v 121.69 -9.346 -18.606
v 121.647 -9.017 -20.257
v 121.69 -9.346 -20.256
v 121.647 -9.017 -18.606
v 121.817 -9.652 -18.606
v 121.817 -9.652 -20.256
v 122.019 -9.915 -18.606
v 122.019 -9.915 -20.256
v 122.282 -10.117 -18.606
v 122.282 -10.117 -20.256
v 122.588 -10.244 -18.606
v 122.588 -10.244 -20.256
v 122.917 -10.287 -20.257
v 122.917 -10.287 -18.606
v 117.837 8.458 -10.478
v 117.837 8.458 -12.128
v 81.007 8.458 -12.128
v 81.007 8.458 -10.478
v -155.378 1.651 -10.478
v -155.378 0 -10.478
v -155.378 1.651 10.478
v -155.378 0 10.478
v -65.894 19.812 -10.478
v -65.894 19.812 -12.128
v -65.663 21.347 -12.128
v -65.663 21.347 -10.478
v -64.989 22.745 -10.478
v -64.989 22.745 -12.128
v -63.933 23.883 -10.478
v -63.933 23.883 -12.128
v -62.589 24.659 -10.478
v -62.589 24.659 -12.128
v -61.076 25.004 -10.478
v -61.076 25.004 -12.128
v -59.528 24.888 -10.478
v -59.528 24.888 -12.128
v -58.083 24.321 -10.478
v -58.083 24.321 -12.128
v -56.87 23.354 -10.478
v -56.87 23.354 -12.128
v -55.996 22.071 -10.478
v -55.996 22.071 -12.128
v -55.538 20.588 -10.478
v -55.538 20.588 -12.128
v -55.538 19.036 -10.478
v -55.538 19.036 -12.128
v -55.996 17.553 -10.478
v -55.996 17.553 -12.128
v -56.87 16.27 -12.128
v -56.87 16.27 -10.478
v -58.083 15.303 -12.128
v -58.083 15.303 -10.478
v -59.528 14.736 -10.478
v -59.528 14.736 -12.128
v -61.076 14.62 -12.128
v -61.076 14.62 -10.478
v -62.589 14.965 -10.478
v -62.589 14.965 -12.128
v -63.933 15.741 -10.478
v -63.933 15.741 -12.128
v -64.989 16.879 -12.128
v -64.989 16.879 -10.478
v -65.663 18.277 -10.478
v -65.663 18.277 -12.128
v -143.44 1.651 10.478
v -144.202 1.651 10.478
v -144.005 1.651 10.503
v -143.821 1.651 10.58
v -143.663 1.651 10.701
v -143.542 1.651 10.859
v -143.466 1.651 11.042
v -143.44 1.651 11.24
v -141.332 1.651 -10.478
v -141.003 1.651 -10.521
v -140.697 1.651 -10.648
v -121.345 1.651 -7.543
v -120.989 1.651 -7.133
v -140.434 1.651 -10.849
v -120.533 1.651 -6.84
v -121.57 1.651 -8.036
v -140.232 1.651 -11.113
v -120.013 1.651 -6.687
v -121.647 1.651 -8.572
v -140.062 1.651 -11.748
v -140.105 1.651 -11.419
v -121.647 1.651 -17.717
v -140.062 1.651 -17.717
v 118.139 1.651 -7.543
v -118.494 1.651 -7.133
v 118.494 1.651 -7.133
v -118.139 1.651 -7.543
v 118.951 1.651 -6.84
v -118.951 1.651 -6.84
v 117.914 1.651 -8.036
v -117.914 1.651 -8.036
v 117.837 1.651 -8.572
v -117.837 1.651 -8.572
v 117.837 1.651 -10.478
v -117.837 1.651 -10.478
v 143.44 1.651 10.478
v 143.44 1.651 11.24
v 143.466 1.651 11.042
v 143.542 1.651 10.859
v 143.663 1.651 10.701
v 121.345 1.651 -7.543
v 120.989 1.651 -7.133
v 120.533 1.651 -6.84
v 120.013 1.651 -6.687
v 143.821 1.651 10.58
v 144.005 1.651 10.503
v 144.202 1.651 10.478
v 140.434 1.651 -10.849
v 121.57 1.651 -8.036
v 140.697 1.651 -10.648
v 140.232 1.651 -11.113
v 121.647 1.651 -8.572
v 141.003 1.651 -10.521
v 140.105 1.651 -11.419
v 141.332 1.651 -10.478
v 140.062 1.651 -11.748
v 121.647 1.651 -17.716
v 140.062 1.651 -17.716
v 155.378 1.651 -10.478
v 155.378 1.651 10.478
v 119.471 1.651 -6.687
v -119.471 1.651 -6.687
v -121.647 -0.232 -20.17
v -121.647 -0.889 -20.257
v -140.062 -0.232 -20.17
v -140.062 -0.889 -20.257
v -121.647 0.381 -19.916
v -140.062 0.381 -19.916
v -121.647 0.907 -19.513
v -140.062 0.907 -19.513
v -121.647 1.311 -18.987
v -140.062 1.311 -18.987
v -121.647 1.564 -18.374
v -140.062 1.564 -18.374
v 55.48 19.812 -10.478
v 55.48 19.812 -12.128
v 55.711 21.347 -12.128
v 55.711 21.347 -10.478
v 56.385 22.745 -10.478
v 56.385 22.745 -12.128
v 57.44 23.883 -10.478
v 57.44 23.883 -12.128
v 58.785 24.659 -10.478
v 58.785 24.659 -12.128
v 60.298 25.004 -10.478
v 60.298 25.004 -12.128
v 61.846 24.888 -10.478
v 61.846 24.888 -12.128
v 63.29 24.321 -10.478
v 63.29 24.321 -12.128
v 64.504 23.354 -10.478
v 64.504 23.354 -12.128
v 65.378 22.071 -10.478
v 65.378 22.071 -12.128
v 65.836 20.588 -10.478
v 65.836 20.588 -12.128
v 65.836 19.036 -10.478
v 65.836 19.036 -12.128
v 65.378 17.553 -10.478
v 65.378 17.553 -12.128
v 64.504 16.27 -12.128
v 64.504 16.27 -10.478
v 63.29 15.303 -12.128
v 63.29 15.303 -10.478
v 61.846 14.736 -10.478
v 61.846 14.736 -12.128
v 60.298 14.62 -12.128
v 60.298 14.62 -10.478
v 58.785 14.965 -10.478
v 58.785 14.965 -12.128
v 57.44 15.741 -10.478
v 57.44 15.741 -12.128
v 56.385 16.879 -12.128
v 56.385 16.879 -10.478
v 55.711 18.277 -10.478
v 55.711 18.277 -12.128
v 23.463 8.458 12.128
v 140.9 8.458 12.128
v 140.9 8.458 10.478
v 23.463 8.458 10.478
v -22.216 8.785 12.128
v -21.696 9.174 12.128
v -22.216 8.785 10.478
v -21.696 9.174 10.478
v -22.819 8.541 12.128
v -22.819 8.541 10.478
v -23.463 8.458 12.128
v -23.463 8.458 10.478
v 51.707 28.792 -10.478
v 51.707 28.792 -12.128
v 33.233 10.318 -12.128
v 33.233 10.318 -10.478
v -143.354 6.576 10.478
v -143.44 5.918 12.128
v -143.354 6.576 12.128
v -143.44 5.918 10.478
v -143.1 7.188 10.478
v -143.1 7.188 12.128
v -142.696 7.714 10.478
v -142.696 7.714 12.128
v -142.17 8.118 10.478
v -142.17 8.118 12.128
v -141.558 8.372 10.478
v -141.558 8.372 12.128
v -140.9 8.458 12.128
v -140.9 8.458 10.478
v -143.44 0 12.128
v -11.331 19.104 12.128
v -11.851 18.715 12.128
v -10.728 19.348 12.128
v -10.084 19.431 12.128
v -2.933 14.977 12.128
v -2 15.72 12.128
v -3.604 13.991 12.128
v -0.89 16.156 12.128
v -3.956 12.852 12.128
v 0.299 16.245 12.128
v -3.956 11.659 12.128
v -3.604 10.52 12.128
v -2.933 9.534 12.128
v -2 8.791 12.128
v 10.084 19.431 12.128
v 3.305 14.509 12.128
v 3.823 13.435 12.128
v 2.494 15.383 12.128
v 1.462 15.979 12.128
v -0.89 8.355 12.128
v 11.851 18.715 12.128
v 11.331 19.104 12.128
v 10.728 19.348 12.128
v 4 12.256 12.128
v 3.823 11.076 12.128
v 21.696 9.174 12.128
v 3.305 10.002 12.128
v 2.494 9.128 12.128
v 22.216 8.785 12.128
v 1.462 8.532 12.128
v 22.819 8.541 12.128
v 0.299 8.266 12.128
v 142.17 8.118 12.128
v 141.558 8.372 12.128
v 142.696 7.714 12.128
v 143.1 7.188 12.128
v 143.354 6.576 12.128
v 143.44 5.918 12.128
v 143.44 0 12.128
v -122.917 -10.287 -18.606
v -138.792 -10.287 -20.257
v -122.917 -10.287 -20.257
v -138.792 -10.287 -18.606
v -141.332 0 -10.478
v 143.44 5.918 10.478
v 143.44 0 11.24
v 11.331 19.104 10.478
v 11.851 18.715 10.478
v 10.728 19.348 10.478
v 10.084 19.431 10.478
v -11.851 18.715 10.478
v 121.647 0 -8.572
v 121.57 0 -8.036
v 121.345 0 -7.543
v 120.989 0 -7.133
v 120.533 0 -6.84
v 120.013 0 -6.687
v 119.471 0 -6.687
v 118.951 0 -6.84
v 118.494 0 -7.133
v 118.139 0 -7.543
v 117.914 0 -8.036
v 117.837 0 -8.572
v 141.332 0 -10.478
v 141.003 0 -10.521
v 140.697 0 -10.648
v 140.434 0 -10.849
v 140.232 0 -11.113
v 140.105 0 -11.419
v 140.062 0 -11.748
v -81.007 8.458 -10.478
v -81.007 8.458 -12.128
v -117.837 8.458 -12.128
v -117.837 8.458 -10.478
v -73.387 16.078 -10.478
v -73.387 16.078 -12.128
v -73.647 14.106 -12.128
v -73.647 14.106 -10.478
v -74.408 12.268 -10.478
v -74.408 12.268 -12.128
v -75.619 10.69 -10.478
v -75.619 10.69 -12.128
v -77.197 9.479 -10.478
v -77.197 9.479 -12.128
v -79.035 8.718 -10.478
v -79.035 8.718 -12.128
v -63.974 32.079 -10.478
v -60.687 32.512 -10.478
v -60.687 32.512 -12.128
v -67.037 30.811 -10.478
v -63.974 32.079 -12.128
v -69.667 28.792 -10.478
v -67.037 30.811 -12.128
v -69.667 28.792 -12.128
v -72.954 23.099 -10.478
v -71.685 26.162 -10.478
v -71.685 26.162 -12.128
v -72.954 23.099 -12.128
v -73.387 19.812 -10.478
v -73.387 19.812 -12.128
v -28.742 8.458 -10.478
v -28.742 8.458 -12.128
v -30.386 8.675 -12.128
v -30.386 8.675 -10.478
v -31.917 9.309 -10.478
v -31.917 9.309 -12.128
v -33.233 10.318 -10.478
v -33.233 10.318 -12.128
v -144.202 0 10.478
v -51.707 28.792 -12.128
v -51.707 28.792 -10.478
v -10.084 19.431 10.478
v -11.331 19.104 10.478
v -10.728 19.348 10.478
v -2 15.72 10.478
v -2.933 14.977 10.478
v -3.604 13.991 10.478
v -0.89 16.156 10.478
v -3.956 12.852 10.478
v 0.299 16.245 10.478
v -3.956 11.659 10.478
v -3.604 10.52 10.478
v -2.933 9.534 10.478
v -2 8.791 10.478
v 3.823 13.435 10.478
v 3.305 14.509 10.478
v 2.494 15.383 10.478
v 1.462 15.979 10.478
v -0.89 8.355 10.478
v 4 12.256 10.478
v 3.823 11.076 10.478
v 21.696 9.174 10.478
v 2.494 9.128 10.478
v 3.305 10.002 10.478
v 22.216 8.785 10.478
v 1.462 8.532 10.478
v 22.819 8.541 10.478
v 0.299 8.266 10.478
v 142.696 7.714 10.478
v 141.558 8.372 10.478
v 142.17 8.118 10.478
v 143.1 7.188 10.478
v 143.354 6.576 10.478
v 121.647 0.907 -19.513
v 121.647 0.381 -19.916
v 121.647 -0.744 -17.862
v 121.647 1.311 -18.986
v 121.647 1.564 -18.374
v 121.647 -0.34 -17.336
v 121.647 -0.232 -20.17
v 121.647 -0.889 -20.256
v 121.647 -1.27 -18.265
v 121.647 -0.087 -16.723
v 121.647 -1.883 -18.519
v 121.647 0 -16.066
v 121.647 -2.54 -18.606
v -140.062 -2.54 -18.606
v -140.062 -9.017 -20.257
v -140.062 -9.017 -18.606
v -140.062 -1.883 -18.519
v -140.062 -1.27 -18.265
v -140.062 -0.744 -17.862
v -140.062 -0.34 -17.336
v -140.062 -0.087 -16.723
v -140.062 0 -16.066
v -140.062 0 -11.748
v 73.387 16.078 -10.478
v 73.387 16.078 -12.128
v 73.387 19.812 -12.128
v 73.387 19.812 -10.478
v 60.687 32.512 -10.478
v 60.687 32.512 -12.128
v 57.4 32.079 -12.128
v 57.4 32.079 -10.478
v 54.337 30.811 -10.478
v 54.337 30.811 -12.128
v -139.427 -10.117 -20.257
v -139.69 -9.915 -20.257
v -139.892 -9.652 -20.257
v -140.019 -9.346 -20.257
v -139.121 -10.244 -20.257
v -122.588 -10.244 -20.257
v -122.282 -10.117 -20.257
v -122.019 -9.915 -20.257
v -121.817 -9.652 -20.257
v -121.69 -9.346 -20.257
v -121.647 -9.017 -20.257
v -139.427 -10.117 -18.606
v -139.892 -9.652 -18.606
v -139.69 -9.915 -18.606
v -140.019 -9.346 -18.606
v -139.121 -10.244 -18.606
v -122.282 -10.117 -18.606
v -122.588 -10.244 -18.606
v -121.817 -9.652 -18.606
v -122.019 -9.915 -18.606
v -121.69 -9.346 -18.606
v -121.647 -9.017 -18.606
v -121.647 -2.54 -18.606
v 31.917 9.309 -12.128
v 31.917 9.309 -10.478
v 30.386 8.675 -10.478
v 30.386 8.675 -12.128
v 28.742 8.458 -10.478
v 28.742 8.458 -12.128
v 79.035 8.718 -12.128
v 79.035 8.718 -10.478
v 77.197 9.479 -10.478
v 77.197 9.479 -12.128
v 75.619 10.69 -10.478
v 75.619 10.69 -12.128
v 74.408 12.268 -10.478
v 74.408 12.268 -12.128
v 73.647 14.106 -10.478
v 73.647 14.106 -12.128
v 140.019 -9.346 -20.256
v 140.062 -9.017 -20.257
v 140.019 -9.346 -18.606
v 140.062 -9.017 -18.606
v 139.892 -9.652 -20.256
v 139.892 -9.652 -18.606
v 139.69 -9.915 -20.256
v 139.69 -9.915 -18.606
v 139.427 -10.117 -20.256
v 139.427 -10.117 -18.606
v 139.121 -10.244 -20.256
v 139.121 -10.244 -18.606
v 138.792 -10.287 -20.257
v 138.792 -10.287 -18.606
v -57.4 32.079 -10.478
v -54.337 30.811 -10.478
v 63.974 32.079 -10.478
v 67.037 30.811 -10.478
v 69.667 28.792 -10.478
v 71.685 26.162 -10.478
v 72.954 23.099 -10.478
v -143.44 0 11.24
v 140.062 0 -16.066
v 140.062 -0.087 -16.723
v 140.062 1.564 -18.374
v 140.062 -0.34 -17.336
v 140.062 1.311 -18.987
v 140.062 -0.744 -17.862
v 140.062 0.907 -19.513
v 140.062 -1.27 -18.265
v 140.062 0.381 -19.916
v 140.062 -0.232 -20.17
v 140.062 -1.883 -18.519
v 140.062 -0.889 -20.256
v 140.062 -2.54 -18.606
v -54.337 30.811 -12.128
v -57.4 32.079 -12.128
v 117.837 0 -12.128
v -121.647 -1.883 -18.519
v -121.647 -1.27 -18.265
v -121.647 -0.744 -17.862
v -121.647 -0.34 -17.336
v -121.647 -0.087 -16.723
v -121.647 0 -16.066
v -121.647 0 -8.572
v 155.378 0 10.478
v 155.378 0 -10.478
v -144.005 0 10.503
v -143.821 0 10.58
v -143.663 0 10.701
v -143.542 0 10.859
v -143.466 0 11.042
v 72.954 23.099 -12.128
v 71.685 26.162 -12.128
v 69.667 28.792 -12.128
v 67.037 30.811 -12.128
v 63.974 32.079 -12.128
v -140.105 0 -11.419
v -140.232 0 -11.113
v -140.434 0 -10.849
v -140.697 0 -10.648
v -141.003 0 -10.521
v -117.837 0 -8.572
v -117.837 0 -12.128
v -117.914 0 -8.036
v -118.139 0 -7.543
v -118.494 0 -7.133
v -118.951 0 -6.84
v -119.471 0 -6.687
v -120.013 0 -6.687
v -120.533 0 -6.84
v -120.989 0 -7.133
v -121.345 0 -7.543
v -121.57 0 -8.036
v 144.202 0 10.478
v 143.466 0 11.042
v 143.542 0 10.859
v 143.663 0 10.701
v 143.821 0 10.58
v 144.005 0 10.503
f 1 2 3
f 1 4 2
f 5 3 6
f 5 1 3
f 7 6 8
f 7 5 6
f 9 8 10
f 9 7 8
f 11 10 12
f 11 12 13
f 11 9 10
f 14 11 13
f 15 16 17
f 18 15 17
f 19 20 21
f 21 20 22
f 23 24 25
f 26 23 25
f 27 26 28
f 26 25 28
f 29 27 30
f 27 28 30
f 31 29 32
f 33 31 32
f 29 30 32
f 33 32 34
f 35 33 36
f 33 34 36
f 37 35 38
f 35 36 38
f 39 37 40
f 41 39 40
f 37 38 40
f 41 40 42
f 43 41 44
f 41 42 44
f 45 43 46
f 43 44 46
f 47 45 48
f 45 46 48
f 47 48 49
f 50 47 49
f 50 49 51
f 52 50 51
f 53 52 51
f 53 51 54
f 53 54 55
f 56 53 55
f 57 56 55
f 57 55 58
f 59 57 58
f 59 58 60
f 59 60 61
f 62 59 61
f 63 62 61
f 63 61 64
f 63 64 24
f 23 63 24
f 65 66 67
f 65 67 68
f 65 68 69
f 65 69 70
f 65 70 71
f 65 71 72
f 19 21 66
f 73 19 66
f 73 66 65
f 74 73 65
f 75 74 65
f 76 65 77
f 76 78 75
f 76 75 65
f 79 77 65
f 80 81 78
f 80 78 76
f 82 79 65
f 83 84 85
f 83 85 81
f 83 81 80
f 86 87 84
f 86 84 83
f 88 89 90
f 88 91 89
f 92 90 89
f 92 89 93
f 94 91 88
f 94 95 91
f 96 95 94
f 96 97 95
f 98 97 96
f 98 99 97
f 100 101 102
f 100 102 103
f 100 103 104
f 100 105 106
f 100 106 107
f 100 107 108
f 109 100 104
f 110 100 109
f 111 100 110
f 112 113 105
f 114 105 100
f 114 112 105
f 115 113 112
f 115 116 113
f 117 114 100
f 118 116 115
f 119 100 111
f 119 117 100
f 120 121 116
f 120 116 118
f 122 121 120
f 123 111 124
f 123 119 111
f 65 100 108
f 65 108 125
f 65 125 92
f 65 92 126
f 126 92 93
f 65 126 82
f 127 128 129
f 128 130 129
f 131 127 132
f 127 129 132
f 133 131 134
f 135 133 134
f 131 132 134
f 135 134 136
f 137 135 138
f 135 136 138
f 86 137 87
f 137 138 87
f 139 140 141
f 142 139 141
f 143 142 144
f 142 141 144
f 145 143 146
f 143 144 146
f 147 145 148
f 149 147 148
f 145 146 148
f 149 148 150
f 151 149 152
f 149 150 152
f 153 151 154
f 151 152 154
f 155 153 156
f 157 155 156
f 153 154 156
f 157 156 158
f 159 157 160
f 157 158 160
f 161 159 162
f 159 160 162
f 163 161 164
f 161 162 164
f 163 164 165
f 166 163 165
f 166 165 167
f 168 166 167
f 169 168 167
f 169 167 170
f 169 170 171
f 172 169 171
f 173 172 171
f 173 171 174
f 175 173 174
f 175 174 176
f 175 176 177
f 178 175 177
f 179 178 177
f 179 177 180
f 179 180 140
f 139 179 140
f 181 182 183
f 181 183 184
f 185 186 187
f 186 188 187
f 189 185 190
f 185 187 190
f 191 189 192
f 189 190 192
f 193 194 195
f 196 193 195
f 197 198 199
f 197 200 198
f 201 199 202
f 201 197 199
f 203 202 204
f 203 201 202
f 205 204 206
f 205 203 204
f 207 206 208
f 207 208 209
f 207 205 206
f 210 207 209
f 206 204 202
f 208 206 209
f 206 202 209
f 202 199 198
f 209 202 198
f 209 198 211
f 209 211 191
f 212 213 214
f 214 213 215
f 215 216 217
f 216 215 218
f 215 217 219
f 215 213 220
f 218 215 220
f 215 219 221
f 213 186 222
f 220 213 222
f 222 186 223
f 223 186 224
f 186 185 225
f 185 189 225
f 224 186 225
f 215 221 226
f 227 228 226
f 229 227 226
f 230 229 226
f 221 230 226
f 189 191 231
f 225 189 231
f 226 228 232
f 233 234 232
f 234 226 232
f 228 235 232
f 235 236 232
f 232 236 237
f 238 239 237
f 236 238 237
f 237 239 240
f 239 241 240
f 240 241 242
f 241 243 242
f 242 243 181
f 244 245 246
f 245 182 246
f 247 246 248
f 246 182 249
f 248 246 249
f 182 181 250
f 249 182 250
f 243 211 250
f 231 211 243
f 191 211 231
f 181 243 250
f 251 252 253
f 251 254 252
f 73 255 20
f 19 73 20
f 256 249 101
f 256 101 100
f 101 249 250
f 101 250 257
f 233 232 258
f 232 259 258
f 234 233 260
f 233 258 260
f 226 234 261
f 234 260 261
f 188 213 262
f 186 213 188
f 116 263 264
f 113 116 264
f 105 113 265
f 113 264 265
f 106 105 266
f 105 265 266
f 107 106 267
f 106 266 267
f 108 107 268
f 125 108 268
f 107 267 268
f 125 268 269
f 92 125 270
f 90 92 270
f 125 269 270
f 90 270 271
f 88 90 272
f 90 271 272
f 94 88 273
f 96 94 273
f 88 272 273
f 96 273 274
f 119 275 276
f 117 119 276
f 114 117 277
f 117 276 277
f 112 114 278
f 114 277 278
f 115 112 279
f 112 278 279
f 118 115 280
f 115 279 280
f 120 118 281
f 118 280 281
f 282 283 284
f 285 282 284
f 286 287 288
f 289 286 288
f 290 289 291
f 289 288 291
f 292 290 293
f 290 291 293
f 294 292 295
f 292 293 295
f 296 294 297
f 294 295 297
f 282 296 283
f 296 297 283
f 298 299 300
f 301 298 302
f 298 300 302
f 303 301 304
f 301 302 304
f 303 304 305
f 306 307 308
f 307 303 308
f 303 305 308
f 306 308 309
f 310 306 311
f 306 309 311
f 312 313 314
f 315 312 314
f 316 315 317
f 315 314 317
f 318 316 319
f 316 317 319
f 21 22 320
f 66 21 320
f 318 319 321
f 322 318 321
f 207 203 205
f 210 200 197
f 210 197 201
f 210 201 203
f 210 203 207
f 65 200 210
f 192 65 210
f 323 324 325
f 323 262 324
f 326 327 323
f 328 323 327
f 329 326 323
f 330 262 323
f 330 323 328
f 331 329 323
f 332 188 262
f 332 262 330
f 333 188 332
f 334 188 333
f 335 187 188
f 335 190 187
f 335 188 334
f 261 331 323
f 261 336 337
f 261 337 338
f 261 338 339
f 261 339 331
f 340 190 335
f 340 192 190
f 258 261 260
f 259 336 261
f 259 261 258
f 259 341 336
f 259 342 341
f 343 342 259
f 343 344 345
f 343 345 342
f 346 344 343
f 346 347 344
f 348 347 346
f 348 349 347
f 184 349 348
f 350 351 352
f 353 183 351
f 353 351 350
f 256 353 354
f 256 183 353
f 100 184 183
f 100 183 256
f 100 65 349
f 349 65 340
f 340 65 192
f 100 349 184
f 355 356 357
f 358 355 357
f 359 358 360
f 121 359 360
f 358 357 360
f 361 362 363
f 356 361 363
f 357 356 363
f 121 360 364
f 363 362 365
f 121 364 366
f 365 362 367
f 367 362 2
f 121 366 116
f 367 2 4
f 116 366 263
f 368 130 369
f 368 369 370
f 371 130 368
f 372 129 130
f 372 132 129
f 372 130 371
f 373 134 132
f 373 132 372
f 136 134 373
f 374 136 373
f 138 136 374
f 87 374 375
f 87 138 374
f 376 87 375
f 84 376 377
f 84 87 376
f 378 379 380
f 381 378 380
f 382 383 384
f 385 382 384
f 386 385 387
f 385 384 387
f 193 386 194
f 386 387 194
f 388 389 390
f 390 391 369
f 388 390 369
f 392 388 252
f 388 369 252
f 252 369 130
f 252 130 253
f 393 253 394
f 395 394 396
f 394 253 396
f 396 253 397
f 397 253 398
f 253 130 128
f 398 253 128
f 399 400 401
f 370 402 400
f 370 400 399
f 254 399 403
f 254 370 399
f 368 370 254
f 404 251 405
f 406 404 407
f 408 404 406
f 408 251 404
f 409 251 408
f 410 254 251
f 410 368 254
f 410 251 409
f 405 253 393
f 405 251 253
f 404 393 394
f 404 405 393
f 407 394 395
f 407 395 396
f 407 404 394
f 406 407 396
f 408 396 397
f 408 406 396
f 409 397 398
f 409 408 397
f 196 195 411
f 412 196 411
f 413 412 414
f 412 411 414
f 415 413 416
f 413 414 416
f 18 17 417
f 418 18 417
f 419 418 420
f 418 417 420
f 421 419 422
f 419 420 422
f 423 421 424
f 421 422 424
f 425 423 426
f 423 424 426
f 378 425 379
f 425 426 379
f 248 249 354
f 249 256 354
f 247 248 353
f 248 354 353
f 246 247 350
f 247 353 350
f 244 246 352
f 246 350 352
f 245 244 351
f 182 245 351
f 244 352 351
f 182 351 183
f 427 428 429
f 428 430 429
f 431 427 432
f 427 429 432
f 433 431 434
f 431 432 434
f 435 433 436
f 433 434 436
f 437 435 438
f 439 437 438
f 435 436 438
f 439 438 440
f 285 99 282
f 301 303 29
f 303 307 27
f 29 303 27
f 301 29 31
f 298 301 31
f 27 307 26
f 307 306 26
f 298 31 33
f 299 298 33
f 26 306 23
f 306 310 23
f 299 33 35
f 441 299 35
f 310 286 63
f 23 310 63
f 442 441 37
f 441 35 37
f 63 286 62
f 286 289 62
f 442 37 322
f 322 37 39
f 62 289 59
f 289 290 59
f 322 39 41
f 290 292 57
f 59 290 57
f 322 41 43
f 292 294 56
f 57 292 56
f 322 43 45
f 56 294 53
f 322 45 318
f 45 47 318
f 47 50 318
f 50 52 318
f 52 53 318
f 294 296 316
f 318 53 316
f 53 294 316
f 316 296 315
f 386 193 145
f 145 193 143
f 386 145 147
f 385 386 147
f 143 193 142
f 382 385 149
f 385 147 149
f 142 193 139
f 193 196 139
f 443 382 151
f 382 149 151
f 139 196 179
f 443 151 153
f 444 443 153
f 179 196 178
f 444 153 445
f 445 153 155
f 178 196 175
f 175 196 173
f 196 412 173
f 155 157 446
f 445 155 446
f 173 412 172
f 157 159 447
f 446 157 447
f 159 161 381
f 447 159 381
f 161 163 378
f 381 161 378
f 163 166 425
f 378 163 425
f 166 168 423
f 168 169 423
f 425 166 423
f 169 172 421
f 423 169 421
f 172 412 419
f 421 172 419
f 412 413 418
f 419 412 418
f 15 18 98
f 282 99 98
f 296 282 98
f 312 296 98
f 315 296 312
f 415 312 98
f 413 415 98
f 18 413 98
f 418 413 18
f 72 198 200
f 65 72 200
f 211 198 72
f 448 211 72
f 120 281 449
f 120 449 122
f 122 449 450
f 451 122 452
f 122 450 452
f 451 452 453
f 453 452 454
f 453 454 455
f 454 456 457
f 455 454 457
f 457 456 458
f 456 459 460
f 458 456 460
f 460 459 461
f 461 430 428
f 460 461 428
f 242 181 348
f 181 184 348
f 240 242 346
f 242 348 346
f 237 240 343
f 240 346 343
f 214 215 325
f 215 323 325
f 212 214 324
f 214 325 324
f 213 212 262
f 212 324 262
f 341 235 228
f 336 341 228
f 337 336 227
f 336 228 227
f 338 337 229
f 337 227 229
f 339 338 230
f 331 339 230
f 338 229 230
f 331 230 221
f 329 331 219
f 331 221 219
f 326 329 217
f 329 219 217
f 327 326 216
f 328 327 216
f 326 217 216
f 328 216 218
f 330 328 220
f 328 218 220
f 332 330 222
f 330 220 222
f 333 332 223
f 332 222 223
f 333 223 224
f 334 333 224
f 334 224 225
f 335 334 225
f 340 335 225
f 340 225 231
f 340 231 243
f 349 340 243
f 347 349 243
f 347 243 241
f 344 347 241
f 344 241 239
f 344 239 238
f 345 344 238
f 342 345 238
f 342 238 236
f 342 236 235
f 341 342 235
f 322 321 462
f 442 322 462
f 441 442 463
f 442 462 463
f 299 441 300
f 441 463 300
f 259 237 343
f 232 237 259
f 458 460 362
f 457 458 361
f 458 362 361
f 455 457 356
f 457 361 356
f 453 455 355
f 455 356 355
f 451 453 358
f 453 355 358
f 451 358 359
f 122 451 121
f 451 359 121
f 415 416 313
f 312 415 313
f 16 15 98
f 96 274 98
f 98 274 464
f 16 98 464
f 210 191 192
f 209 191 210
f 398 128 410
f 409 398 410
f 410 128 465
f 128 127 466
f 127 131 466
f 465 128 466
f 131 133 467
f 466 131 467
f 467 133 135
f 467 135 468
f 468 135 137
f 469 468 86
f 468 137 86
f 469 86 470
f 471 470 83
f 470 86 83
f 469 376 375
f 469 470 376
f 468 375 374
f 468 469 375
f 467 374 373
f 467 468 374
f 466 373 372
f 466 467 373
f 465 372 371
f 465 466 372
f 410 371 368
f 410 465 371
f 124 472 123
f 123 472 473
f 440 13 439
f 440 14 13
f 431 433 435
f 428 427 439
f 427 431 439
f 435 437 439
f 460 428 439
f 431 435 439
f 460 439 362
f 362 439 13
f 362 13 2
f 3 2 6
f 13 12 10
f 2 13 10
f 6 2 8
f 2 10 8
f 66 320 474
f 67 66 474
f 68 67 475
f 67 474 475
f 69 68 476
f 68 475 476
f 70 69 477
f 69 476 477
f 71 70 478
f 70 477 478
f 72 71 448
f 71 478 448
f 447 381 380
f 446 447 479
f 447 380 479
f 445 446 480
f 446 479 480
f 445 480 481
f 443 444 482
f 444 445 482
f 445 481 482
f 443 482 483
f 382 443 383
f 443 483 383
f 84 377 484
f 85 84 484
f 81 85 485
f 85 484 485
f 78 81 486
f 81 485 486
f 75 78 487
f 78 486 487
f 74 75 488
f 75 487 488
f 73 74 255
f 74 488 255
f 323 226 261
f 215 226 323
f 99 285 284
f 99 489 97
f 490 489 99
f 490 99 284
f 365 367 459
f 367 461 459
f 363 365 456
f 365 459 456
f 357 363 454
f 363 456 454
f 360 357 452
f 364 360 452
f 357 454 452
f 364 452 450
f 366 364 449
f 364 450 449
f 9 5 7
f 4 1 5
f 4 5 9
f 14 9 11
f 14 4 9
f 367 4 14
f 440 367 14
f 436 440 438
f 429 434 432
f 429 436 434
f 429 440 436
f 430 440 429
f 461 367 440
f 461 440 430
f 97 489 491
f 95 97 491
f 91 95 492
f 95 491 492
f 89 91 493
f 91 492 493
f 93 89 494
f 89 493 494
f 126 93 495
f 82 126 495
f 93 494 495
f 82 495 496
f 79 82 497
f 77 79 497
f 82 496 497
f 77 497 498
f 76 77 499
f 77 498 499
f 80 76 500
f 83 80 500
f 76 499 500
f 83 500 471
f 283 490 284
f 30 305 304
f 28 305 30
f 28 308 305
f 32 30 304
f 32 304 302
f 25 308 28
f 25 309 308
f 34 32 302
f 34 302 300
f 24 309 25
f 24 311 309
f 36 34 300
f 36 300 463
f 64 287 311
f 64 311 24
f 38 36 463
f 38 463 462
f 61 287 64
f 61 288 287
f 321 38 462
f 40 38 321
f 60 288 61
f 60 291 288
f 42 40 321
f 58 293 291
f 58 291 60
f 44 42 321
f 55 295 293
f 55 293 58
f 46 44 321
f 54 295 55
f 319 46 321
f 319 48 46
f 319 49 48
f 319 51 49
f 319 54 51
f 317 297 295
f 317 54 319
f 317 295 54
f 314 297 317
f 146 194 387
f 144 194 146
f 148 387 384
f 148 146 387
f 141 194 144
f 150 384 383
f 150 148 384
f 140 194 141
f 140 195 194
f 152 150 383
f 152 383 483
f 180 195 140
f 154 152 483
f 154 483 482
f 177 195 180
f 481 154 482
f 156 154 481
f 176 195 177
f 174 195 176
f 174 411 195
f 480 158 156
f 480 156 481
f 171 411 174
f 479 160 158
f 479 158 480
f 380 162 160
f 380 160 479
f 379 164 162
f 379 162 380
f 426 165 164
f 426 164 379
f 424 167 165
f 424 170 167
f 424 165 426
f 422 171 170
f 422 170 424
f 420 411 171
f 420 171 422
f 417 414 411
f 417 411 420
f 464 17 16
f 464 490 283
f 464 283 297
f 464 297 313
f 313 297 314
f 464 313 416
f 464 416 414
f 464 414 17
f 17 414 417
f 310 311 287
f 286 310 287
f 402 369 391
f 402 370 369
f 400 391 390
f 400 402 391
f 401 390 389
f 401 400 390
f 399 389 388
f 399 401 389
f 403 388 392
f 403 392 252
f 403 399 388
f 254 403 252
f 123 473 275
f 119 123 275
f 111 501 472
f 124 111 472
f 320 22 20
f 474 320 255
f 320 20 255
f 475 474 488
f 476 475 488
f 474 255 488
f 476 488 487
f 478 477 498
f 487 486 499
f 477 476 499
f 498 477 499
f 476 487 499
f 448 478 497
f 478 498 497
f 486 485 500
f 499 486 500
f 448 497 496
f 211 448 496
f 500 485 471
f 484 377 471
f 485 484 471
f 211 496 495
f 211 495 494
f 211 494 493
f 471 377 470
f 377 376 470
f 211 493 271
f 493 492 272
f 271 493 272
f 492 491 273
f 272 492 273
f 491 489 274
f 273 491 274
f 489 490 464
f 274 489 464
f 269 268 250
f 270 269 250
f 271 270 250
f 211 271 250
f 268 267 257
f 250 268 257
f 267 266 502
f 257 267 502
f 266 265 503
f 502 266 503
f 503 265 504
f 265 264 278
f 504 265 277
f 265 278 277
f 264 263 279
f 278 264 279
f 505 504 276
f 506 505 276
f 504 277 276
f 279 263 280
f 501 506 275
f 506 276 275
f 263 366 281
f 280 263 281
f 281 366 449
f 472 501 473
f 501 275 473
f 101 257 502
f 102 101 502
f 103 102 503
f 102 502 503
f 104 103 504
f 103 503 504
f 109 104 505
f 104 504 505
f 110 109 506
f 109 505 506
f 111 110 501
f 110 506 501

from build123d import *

# Parameters (mm, degrees)
BOSS_EXTRUDE1_DEPTH = 1.651
SKETCH2_W           = 18.415
SKETCH2_H           = 1.651
BOSS_EXTRUDE2_DEPTH = 10.287
FILLET1_R           = 2.54
FILLET3_R           = 1.27
SKETCH4_W           = 235.6739
SKETCH4_H           = 1.651
SKETCH4_W_2         = 286.8803
BOSS_EXTRUDE3_DEPTH = 30.861
SKETCH5_R           = 4.0005
CUT_EXTRUDE2_DEPTH  = 2.54
FILLET4_R           = 2.54
SKETCH11_R          = 5.207
CUT_EXTRUDE3_DEPTH  = 7.62


with BuildPart() as part:
    # Sketch1 → Boss-Extrude1 (new body)
    with BuildSketch(Plane(origin=(0, 0, 0), x_dir=(1, 0, 0), z_dir=(0, 1, 0))):
        with BuildLine():
            Line((117.83695, 8.5725), (117.83695, 12.1285))
            Line((117.83695, 12.1285), (117.186124302, 12.1285))
            Line((117.186124302, 12.1285), (-117.186124302, 12.1285))
            Line((-117.186124302, 12.1285), (-117.83695, 12.1285))
            Line((-117.83695, 12.1285), (-117.83695, 8.5725))
            ThreePointArc((-117.83695, 8.5725), (-119.74195, 6.6675), (-121.64695, 8.5725))
            Line((-121.64695, 8.5725), (-121.64695, 12.1285))
            Line((-121.64695, 12.1285), (-121.64695, 20.2565))
            Line((-121.64695, 20.2565), (-140.06195, 20.2565))
            Line((-140.06195, 20.2565), (-140.06195, 12.1285))
            Line((-140.06195, 12.1285), (-140.06195, 11.7475))
            ThreePointArc((-140.06195, 11.7475), (-140.433924388, 10.849474388), (-141.33195, 10.4775))
            Line((-141.33195, 10.4775), (-143.44015, 10.4775))
            Line((-143.44015, 10.4775), (-155.37815, 10.4775))
            Line((-155.37815, 10.4775), (-155.37815, -10.4775))
            Line((-155.37815, -10.4775), (-144.20215, -10.4775))
            ThreePointArc((-144.20215, -10.4775), (-143.663334633, -10.700684633), (-143.44015, -11.2395))
            Line((-143.44015, -11.2395), (-143.44015, -12.1285))
            Line((-143.44015, -12.1285), (143.44015, -12.1285))
            Line((143.44015, -12.1285), (143.44015, -11.2395))
            ThreePointArc((143.44015, -11.2395), (143.663334633, -10.700684633), (144.20215, -10.4775))
            Line((144.20215, -10.4775), (155.37815, -10.4775))
            Line((155.37815, -10.4775), (155.37815, 10.4775))
            Line((155.37815, 10.4775), (143.44015, 10.4775))
            Line((143.44015, 10.4775), (141.33195, 10.4775))
            ThreePointArc((141.33195, 10.4775), (140.433924388, 10.849474388), (140.06195, 11.7475))
            Line((140.06195, 11.7475), (140.06195, 12.1285))
            Line((140.06195, 12.1285), (140.06195, 20.2565))
            Line((140.06195, 20.2565), (121.64695, 20.2565))
            Line((121.64695, 20.2565), (121.64695, 12.1285))
            Line((121.64695, 12.1285), (121.64695, 8.5725))
            ThreePointArc((121.64695, 8.5725), (119.74195, 6.6675), (117.83695, 8.5725))
        make_face()
    extrude(amount=BOSS_EXTRUDE1_DEPTH)

    # Sketch2 → Boss-Extrude2 (add)
    with BuildSketch(Plane.XZ):
        with Locations((-130.85445, -19.431)):
            Rectangle(SKETCH2_W, SKETCH2_H)
        with Locations((130.85445, -19.431)):
            Rectangle(SKETCH2_W, SKETCH2_H)
    extrude(amount=BOSS_EXTRUDE2_DEPTH)

    # Fillet1
    fillet1_edges = [part.edges().sort_by_distance(p)[0] for p in [
        (130.85445, 1.651, -20.2565),
        (-130.85445, 1.651, -20.2565),
        (-130.85445, 0, -18.6055),
        (130.85445, 0, -18.6055),
    ]]
    fillet(fillet1_edges, radius=FILLET1_R)

    # Fillet3
    fillet3_edges = [part.edges().sort_by_distance(p)[0] for p in [
        (-140.06195, -10.287, -19.431),
        (-121.64695, -10.287, -19.431),
        (140.06195, -10.287, -19.431),
        (121.64695, -10.287, -19.431),
    ]]
    fillet(fillet3_edges, radius=FILLET3_R)

    # Sketch4 → Boss-Extrude3 (add)
    with BuildSketch(Plane(origin=(0, 1.651, 0), x_dir=(1, 0, 0), z_dir=(0, 1, 0))):
        with Locations((0, 11.303)):
            Rectangle(SKETCH4_W, SKETCH4_H)
        with Locations((0, -11.303)):
            Rectangle(SKETCH4_W_2, SKETCH4_H)
    extrude(amount=BOSS_EXTRUDE3_DEPTH)

    # Sketch5 → Cut-Extrude2 (cut)
    with BuildSketch(Plane.XY.offset(12.1285)):
        with Locations((0, 12.2555)):
            Circle(SKETCH5_R)
        Polygon((143.44015, 8.4582), (22.43455, 8.4582), (11.1125, 19.431), (-11.1125, 19.431), (-22.43455, 8.4582), (-143.44015, 8.4582), (-143.44015, 32.512), (143.44015, 32.512), align=None)
    extrude(amount=-CUT_EXTRUDE2_DEPTH, mode=Mode.SUBTRACT)

    # Fillet4
    fillet4_edges = [part.edges().sort_by_distance(p)[0] for p in [
        (143.44015, 8.4582, 11.303),
        (22.43455, 8.4582, 11.303),
        (11.1125, 19.431, 11.303),
        (-11.1125, 19.431, 11.303),
        (-22.43455, 8.4582, 11.303),
        (-143.44015, 8.4582, 11.303),
    ]]
    fillet(fillet4_edges, radius=FILLET4_R)

    # Sketch11 → Cut-Extrude3 (cut)
    with BuildSketch(Plane(origin=(0, 0, -12.1285), x_dir=(-1, 0, 0), z_dir=(0, 0, -1))):
        with Locations((60.68695, 19.812)):
            Circle(SKETCH11_R)
        with Locations((-60.68695, 19.812)):
            Circle(SKETCH11_R)
        with BuildLine():
            Line((81.00695, 8.4582), (117.83695, 8.4582))
            Line((117.83695, 8.4582), (117.83695, 32.512))
            Line((117.83695, 32.512), (60.68695, 32.512))
            ThreePointArc((60.68695, 32.512), (69.667206121, 28.792256121), (73.38695, 19.812))
            Line((73.38695, 19.812), (73.38695, 16.0782))
            ThreePointArc((73.38695, 16.0782), (75.618796327, 10.690046327), (81.00695, 8.4582))
        make_face()
        with BuildLine():
            Line((-28.742381637, 8.4582), (0, 8.4582))
            Line((0, 8.4582), (28.742381637, 8.4582))
            ThreePointArc((28.742381637, 8.4582), (31.172421432, 8.941564969), (33.232509697, 10.318071939))
            Line((33.232509697, 10.318071939), (51.706693879, 28.792256121))
            ThreePointArc((51.706693879, 28.792256121), (55.826870409, 31.545270063), (60.68695, 32.512))
            Line((60.68695, 32.512), (-60.68695, 32.512))
            ThreePointArc((-60.68695, 32.512), (-55.826870409, 31.545270063), (-51.706693879, 28.792256121))
            Line((-51.706693879, 28.792256121), (-33.232509697, 10.318071939))
            ThreePointArc((-33.232509697, 10.318071939), (-31.172421432, 8.941564969), (-28.742381637, 8.4582))
        make_face()
        with BuildLine():
            Line((-117.83695, 32.512), (-117.83695, 8.4582))
            Line((-117.83695, 8.4582), (-81.00695, 8.4582))
            ThreePointArc((-81.00695, 8.4582), (-75.618796327, 10.690046327), (-73.38695, 16.0782))
            Line((-73.38695, 16.0782), (-73.38695, 19.812))
            ThreePointArc((-73.38695, 19.812), (-69.667206121, 28.792256121), (-60.68695, 32.512))
            Line((-60.68695, 32.512), (-117.83695, 32.512))
        make_face()
    extrude(amount=-CUT_EXTRUDE3_DEPTH, mode=Mode.SUBTRACT)


solid = part.part
